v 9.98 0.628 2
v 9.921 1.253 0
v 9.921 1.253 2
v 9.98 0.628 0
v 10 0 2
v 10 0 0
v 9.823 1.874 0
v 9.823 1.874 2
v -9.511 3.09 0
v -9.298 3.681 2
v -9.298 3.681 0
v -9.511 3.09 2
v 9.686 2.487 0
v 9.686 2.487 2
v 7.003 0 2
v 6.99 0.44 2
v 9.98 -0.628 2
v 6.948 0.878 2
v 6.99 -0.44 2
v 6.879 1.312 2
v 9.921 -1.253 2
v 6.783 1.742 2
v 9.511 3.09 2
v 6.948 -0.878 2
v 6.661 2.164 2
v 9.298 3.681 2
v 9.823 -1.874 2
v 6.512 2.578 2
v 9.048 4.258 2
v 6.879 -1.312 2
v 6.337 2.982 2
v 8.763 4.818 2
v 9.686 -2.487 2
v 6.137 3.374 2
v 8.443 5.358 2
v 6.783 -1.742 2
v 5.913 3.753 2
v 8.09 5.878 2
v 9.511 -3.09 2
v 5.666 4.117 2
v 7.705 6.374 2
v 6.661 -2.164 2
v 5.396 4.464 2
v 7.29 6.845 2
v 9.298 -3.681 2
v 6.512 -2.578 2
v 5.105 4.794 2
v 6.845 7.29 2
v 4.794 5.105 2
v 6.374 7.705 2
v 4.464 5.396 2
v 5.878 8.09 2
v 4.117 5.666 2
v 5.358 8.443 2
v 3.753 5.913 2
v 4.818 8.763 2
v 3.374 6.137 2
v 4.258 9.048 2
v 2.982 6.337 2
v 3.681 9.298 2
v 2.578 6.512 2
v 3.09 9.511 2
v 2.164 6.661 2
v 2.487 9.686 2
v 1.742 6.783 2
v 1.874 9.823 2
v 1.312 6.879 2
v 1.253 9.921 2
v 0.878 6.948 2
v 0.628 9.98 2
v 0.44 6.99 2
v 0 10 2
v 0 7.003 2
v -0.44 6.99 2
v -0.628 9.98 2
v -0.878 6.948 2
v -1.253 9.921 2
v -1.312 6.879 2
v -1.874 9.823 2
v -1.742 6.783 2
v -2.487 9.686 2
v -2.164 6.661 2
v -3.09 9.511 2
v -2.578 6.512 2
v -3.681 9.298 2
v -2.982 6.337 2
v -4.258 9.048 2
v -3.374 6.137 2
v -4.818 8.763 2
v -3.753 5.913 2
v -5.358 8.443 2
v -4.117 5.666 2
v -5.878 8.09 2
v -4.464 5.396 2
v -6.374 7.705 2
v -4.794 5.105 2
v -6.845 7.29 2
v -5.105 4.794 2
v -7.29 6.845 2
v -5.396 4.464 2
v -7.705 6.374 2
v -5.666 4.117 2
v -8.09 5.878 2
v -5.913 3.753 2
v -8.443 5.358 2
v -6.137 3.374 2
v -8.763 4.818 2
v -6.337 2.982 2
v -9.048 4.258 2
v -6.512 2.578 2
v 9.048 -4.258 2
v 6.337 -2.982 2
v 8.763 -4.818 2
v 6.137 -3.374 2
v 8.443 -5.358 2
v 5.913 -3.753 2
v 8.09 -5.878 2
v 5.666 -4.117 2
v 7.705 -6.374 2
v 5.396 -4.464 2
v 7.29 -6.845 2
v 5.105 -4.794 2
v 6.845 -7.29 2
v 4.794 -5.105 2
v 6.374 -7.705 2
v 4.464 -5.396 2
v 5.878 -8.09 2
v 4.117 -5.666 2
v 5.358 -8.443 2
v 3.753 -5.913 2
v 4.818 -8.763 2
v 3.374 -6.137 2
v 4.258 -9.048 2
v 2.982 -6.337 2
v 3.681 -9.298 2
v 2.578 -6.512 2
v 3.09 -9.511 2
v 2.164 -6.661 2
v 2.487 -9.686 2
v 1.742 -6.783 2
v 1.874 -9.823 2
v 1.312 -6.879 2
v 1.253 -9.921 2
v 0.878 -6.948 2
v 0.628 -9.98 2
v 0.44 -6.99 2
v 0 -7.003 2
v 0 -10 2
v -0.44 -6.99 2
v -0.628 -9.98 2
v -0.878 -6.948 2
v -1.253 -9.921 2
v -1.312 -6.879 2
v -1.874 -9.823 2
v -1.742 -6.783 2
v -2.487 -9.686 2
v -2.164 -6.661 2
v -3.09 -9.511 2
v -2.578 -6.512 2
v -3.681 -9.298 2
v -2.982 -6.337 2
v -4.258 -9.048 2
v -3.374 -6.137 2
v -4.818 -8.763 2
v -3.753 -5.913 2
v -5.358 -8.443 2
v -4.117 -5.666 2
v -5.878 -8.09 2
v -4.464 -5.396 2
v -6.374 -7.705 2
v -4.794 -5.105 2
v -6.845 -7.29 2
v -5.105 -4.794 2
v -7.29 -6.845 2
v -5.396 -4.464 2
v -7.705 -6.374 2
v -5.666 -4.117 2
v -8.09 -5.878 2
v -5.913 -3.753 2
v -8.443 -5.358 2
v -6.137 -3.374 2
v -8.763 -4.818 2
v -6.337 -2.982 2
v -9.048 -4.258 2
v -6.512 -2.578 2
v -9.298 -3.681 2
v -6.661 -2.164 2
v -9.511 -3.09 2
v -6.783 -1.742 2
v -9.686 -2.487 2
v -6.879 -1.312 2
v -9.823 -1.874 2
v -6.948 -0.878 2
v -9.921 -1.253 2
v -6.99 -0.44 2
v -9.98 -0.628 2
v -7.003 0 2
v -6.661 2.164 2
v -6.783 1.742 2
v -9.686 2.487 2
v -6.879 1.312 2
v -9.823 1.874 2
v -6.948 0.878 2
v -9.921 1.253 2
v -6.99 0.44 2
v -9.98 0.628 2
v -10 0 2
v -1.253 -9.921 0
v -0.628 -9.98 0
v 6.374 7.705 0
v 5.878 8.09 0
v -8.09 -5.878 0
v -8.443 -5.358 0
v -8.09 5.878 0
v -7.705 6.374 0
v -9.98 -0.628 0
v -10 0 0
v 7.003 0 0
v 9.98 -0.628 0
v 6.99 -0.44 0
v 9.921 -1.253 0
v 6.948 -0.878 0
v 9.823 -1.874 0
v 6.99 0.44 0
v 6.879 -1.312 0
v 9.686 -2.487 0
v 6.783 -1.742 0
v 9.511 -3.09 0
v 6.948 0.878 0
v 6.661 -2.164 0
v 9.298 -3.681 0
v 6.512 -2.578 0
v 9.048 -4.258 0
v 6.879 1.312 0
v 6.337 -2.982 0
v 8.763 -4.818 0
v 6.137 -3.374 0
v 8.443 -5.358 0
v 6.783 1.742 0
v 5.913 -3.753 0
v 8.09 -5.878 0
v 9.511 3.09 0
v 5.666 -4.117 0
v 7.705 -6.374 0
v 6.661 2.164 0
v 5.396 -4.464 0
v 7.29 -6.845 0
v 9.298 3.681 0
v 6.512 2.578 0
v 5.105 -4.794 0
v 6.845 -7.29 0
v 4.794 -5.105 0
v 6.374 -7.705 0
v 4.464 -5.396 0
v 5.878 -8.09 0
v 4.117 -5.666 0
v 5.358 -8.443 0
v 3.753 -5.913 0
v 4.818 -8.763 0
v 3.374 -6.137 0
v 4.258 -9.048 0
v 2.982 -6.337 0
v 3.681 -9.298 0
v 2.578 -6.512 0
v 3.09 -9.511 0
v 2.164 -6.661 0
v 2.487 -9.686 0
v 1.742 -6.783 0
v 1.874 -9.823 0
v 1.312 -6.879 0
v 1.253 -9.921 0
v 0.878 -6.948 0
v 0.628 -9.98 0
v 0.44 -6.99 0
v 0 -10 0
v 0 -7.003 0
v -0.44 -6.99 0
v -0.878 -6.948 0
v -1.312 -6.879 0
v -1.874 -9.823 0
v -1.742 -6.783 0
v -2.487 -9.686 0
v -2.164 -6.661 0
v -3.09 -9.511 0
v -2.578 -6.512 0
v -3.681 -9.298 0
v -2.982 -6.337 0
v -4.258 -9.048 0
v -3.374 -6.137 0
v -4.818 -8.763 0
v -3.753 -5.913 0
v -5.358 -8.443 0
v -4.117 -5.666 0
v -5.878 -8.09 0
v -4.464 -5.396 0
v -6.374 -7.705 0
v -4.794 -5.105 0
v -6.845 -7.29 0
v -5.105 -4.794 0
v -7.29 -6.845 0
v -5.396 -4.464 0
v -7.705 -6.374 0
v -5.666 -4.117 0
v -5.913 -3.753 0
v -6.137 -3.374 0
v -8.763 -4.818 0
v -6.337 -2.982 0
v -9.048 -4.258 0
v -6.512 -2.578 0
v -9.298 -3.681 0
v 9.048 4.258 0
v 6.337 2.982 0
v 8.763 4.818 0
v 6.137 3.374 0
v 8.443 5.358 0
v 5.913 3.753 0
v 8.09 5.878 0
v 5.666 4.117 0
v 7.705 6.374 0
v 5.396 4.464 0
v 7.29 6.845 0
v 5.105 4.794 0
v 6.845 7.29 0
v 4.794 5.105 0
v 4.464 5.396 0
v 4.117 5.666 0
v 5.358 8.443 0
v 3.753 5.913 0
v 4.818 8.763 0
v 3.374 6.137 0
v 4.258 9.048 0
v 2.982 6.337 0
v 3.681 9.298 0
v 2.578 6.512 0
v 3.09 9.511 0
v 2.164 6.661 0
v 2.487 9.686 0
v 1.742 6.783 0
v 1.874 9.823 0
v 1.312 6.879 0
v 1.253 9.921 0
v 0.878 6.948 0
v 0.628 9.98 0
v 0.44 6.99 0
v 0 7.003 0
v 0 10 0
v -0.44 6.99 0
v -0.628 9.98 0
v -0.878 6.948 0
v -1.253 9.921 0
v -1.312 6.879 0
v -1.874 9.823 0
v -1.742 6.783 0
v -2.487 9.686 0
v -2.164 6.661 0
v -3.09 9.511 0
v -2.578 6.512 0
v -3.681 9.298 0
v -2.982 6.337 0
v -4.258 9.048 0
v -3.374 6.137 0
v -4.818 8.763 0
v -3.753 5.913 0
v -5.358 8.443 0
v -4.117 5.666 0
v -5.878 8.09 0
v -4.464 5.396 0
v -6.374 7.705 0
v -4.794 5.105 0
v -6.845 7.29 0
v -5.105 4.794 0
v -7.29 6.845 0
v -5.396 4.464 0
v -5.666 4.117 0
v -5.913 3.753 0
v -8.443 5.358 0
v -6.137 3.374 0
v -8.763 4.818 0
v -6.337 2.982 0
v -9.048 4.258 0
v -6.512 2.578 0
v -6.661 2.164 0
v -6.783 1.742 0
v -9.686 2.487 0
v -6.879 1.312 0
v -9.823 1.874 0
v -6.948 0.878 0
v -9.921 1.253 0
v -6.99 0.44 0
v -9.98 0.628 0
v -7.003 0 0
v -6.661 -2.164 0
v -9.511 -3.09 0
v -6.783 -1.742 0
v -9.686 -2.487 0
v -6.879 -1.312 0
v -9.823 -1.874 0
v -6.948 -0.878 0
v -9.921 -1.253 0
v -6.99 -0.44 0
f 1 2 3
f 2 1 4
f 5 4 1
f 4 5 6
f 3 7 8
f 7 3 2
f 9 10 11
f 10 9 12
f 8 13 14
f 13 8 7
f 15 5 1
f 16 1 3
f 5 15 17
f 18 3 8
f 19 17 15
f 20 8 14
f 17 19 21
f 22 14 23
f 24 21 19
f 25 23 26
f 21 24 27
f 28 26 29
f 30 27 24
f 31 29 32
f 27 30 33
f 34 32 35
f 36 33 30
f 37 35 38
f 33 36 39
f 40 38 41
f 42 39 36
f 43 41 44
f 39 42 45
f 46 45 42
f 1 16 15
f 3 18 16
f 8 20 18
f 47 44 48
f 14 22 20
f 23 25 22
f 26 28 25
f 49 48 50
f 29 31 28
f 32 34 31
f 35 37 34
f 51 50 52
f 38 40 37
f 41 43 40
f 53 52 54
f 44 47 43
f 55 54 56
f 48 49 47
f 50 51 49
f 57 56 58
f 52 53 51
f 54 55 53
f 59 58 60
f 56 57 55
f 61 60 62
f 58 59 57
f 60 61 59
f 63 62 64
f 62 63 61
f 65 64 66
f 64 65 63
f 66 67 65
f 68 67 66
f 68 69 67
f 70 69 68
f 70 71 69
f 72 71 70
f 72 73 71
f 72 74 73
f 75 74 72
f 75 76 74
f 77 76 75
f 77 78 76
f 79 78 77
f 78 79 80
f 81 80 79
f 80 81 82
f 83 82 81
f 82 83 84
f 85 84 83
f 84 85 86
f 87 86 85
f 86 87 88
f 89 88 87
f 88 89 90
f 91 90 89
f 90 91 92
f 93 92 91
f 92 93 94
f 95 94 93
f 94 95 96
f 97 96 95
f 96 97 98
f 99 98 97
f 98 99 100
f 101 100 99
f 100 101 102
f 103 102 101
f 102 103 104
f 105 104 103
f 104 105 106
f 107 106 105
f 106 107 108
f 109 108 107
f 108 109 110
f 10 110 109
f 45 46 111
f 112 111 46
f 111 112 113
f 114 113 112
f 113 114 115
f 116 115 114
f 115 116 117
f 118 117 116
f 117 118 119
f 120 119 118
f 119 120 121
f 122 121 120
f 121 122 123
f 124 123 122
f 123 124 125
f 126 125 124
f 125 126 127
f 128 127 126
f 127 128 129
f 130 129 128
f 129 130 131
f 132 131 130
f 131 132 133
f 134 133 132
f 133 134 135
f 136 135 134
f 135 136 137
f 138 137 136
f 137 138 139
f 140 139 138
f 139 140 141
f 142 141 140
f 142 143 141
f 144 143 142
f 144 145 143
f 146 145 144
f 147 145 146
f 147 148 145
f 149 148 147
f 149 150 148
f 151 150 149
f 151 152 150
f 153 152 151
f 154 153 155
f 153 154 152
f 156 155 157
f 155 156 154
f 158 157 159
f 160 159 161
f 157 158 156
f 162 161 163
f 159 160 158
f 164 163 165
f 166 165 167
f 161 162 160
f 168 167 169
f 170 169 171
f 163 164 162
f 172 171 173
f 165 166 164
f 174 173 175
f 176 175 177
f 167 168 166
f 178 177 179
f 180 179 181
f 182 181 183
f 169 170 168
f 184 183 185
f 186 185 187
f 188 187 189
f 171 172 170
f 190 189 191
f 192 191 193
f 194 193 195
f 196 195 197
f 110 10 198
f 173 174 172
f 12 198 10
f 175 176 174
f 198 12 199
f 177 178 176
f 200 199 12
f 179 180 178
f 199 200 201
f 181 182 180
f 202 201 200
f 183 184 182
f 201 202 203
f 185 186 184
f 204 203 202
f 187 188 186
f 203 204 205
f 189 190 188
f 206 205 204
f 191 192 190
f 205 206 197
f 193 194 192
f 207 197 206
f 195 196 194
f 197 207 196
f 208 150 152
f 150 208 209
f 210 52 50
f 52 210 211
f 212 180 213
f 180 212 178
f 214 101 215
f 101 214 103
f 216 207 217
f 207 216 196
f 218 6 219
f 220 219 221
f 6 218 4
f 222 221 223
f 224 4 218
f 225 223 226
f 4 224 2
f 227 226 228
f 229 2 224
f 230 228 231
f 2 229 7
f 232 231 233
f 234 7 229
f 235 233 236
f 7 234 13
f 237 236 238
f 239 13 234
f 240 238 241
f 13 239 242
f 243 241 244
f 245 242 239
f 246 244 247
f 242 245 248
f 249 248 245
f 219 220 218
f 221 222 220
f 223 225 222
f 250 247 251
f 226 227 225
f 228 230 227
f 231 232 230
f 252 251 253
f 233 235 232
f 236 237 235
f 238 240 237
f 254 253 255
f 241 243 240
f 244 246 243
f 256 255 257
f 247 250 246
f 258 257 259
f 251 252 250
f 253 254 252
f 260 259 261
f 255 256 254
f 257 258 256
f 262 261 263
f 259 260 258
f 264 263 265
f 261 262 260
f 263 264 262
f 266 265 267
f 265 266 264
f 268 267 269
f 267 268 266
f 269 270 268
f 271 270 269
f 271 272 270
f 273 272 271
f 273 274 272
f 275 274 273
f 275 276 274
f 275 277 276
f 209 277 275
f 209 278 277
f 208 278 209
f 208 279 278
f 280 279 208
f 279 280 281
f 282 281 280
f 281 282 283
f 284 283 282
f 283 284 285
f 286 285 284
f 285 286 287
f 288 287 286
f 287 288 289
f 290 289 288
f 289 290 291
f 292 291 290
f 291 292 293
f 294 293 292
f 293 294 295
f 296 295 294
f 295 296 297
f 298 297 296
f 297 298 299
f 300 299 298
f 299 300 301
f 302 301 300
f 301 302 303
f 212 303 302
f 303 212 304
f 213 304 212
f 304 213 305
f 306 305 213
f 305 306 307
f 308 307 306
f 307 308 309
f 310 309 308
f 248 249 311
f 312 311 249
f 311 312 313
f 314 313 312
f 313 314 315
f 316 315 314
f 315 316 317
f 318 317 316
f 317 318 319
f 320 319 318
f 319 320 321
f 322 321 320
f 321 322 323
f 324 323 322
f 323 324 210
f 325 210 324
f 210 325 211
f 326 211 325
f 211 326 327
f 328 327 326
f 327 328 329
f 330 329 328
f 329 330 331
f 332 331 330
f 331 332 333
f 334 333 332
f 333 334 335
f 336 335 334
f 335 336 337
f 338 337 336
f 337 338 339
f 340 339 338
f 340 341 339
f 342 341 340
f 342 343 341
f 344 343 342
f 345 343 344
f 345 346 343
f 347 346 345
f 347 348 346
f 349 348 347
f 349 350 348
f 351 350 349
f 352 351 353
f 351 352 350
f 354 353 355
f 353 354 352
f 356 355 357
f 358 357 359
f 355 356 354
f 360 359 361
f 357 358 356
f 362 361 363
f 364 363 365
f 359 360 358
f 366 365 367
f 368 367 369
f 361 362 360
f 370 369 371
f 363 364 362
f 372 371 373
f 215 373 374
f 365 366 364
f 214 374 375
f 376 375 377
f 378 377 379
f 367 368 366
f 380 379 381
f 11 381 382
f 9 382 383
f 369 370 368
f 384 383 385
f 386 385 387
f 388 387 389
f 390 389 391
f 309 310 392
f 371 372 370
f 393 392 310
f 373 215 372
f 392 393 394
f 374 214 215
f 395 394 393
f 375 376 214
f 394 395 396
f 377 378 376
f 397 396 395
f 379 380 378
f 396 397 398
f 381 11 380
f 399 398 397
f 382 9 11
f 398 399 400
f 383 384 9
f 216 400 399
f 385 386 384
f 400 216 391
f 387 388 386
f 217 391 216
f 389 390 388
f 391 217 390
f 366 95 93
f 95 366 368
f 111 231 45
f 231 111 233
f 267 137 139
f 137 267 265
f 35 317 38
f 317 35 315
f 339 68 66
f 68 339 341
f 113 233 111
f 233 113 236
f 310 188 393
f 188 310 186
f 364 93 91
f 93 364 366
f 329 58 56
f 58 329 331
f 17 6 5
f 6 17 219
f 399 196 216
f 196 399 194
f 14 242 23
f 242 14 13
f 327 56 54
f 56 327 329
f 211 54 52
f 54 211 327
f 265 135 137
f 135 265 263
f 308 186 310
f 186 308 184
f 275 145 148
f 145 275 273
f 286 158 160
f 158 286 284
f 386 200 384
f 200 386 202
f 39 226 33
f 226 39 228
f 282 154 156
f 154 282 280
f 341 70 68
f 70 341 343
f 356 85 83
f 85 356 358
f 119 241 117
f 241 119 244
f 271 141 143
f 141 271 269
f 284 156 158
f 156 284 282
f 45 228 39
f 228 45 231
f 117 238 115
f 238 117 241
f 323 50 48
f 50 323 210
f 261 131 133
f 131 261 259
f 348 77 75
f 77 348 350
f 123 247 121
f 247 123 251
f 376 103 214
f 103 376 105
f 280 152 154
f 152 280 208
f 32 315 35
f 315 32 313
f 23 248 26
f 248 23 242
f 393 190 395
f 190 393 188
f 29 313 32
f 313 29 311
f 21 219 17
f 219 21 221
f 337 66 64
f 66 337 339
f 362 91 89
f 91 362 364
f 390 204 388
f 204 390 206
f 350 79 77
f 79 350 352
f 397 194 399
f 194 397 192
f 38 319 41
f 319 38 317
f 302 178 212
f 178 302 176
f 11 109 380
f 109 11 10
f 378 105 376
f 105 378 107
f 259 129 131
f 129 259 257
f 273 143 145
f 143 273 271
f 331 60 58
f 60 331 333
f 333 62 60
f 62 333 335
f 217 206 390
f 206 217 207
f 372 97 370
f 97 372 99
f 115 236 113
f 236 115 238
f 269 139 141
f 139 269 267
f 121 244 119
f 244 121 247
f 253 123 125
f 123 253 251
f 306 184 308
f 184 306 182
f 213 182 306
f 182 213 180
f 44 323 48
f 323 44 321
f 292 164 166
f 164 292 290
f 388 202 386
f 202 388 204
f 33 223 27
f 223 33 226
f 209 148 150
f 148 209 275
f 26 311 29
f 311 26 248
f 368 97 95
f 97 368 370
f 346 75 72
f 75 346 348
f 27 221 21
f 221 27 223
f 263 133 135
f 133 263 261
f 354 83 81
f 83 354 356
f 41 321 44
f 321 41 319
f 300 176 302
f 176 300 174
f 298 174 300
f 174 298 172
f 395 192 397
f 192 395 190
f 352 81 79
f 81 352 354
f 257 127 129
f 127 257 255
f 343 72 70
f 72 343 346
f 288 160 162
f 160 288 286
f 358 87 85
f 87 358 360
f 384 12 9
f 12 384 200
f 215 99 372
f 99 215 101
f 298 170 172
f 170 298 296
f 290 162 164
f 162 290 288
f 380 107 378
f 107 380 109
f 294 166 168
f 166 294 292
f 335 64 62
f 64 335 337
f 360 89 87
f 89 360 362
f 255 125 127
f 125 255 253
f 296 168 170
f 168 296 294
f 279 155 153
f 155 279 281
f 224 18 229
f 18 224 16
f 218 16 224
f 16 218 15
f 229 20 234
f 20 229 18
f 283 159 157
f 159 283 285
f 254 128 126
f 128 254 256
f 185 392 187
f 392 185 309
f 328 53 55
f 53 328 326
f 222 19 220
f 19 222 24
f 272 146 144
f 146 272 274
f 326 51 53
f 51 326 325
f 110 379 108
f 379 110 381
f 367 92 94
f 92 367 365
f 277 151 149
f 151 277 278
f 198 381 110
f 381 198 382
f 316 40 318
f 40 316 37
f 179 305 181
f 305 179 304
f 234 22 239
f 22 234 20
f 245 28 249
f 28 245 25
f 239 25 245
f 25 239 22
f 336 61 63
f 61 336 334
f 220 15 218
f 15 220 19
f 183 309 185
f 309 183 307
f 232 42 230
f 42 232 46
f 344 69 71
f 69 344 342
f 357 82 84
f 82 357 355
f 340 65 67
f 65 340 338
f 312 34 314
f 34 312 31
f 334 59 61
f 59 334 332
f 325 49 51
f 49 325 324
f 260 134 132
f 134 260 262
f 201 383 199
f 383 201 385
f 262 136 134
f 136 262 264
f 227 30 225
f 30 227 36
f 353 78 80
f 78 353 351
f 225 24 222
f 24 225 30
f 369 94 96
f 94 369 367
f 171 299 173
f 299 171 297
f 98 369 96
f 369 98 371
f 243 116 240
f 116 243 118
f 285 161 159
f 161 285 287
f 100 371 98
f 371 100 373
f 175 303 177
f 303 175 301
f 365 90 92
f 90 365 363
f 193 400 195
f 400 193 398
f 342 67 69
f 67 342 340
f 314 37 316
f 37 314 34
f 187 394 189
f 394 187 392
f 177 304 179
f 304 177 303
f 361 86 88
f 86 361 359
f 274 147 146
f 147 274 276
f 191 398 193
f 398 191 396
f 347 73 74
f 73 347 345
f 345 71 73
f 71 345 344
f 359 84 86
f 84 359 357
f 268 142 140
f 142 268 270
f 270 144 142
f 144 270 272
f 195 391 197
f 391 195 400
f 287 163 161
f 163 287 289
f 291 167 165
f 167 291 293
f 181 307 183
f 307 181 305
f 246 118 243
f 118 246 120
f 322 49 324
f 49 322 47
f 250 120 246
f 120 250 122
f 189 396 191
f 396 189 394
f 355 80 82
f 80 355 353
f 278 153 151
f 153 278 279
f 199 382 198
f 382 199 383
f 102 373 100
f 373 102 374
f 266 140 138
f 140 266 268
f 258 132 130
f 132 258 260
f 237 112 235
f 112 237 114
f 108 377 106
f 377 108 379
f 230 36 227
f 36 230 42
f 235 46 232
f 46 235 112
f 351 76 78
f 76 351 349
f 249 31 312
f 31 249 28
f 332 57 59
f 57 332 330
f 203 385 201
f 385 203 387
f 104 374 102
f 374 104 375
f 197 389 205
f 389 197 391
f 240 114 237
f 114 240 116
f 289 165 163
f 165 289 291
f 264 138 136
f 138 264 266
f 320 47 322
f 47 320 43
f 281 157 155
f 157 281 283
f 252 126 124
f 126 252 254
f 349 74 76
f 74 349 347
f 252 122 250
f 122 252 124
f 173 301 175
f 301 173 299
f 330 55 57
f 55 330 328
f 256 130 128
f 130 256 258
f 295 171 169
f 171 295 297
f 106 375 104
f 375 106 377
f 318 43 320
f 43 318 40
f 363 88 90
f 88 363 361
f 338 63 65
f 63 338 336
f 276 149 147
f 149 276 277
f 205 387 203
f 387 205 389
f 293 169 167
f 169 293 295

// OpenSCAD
/*
    By Toke 2017-06-13
    Public domain
*/

outer_radius = 10;
inner_radius = 7;
height = 2;
fn = 100;

/*
    Circular spacer
*/
module spacer(height, outer, inner, fn=100) {
    
    // prevent undersizing (inner vs outer polygon)
    // See: https://en.wikibooks.org/wiki/OpenSCAD_User_Manual/undersized_circular_objects
    fudge = 1/cos(180/fn); // circumscribed

    difference() {
        cylinder(height, outer, outer, $fn=fn);
        
        translate([0, 0, -0.1])
        cylinder(height + 0.2, inner * fudge, inner * fudge, $fn=fn);
    }
}

spacer(height, outer_radius, inner_radius, fn);
